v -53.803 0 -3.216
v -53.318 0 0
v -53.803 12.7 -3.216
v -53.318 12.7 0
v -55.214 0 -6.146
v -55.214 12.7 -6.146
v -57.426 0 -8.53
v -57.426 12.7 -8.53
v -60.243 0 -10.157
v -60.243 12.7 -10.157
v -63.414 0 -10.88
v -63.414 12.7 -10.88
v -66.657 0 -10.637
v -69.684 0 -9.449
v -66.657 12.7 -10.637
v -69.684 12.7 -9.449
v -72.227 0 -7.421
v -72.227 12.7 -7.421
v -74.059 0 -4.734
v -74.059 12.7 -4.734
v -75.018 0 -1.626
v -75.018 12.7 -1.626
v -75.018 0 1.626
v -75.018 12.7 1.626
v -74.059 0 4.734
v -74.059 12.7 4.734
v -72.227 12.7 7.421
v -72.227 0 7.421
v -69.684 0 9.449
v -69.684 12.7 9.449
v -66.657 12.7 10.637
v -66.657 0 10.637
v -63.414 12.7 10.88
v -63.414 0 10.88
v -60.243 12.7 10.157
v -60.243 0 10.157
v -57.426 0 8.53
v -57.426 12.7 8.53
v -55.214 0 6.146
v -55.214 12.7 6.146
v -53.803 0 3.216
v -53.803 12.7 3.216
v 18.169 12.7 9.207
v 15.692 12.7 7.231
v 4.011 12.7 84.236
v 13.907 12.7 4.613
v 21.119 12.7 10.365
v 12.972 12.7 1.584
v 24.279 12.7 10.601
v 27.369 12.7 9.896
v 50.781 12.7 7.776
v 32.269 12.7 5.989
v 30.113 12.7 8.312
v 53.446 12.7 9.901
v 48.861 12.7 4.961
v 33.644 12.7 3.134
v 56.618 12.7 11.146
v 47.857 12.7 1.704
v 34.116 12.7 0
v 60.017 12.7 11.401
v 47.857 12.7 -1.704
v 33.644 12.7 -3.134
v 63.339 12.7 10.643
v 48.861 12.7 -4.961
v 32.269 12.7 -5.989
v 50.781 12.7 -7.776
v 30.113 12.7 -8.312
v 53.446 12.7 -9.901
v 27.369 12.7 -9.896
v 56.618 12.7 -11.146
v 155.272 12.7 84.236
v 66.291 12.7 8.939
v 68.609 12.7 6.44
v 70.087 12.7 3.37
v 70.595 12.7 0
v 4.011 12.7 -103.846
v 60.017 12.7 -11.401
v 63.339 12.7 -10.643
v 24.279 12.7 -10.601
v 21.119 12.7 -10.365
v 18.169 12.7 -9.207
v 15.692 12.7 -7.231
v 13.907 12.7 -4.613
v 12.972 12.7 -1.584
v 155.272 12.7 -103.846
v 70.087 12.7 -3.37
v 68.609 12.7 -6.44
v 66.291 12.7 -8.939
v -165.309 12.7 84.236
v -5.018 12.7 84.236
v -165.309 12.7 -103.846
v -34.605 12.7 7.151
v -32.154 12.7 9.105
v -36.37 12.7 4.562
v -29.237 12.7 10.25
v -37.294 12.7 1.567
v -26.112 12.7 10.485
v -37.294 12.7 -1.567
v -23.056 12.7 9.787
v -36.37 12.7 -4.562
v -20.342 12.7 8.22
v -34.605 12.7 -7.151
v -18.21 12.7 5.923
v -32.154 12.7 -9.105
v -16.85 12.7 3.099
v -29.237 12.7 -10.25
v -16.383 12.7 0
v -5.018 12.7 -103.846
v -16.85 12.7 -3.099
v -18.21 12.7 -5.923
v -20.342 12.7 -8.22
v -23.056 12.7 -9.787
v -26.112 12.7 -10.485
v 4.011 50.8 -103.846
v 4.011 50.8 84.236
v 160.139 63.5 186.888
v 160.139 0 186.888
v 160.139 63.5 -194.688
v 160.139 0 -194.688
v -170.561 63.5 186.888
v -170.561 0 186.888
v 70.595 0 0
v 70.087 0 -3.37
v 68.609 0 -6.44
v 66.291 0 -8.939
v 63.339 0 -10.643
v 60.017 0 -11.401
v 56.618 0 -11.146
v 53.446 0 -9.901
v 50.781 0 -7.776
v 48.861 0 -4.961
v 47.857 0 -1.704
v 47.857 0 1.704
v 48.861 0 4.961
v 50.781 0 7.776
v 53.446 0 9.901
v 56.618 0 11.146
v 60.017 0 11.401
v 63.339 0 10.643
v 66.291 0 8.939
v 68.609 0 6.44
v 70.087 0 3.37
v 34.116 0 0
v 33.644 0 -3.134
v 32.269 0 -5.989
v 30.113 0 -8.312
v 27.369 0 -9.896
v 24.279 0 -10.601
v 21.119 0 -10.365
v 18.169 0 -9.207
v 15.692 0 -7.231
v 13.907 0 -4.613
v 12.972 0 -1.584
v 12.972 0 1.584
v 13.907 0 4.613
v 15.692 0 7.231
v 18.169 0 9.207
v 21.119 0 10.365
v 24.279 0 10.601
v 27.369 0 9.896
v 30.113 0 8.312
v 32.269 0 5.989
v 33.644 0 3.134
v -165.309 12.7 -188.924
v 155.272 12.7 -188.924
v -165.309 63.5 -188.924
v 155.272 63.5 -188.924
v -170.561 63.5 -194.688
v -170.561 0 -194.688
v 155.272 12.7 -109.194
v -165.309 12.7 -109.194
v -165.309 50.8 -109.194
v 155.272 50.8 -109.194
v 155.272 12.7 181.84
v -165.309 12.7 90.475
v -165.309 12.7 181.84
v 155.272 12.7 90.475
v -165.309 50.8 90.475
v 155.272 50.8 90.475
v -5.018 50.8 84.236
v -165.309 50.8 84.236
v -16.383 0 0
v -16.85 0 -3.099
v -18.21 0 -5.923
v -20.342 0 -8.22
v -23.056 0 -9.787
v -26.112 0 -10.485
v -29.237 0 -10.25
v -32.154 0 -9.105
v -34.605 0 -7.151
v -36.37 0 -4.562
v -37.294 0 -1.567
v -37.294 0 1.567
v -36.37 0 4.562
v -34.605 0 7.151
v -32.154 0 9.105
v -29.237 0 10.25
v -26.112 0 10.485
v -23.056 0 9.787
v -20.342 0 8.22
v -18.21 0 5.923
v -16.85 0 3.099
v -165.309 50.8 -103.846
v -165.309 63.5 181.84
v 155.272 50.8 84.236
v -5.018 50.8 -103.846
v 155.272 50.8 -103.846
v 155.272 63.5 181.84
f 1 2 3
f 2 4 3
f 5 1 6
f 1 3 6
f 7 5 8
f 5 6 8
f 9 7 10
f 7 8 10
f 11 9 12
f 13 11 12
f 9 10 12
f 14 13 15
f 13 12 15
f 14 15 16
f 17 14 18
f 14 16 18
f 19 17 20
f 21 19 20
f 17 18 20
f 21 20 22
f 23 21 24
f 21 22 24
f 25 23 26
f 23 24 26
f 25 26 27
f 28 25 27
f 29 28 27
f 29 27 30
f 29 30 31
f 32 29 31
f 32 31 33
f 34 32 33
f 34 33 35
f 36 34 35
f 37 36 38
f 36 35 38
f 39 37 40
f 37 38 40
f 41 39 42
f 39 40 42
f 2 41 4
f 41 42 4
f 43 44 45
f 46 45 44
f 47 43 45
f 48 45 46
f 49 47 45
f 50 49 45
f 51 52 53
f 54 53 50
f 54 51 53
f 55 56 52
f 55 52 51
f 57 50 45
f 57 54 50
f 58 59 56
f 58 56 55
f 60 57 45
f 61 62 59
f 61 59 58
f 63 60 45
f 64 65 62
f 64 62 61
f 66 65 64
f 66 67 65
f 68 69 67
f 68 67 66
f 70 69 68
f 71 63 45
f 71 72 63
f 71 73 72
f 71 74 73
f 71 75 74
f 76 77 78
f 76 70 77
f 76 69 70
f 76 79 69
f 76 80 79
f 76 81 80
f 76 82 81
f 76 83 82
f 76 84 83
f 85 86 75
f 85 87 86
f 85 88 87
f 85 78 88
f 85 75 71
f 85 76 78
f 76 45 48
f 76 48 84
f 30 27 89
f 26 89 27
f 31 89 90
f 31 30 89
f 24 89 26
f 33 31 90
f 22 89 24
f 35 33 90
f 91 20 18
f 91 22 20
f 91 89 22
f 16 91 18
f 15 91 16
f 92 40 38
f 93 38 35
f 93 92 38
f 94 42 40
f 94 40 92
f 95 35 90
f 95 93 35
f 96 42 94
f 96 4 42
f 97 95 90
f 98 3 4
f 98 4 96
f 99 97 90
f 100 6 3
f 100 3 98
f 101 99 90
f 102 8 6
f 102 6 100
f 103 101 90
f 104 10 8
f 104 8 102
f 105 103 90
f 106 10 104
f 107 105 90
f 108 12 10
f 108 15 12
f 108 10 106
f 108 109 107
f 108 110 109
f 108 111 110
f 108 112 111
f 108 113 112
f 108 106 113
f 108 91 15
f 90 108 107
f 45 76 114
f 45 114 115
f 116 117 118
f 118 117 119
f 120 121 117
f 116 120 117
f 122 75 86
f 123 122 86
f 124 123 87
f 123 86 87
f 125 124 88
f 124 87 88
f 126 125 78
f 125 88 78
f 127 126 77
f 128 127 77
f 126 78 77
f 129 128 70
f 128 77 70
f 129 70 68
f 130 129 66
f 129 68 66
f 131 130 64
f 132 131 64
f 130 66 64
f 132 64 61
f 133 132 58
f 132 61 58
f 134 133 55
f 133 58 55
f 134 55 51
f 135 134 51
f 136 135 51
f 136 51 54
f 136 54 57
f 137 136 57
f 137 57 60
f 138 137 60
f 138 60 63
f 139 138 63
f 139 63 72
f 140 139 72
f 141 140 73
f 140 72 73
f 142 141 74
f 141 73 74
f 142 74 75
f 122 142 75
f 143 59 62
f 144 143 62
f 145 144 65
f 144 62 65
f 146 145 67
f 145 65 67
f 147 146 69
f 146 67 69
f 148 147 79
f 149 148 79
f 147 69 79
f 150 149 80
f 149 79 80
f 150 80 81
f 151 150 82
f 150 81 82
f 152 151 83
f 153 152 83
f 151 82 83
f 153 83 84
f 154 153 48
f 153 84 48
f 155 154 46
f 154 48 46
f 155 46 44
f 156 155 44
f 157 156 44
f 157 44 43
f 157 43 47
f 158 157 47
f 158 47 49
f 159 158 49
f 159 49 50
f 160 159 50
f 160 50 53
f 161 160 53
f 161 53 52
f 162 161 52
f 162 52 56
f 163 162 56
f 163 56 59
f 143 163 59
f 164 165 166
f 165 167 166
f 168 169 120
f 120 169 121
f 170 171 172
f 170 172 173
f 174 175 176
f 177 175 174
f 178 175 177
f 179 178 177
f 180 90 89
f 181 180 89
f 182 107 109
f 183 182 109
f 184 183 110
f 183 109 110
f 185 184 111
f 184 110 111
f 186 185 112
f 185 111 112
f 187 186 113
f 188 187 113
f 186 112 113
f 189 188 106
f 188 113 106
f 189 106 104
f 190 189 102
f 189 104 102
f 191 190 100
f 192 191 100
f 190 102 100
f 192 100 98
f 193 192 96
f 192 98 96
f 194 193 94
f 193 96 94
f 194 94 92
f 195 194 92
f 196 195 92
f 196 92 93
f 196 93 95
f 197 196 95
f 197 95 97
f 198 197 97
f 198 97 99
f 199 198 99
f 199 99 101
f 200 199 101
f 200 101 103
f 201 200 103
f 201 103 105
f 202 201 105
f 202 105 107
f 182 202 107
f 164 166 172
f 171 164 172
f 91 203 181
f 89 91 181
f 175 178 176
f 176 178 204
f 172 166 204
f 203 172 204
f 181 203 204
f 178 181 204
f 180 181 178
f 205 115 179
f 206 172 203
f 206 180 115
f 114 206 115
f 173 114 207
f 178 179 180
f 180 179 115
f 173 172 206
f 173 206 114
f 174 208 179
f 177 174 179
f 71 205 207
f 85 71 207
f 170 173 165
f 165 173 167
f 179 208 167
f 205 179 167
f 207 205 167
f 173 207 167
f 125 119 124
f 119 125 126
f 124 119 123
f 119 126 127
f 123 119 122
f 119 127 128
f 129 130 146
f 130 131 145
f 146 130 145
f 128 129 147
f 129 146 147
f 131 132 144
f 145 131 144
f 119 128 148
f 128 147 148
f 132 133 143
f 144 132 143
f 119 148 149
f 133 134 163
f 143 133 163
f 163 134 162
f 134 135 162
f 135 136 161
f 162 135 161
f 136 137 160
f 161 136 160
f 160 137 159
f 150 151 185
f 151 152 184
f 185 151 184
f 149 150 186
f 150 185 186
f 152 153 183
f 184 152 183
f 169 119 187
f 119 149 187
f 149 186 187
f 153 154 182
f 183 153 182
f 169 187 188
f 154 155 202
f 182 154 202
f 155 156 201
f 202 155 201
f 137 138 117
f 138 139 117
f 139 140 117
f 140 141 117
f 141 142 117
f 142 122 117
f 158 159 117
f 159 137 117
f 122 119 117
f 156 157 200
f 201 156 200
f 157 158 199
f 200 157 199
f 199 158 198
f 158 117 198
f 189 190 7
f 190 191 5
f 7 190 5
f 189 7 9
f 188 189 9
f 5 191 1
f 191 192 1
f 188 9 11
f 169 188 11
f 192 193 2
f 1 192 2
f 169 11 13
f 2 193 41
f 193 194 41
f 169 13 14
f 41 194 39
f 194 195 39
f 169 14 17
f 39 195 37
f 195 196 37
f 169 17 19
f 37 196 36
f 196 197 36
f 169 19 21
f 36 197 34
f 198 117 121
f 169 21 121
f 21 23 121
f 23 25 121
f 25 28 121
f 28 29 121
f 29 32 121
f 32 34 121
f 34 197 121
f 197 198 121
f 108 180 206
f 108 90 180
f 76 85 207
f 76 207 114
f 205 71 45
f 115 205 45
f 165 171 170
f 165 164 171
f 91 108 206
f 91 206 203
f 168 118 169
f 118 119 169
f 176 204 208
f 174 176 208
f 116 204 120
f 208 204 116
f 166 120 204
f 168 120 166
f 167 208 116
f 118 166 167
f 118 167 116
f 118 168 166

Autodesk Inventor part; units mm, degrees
ref_plane "YZ Plane" through (0, 0, 0) normal (1, 0, 0) x (0, 1, 0)
ref_plane "XZ Plane" through (0, 0, 0) normal (0, 1, 0) x (-1, 0, 0)
ref_plane "XY Plane" through (0, 0, 0) normal (0, 0, 1) x (1, 0, 0)
sketch "Sketch2" plane through (0, 0, 0) normal (0, 1, 0) x (-1, 0, 0)
  line L0 (170.5606, 186.8878) -> (-160.1389, 186.8878)
  line L1 (-160.1389, 186.8878) -> (-160.1389, -194.6885)
  line L2 (-160.1389, -194.6885) -> (170.5606, -194.6885)
  line L3 (170.5606, -194.6885) -> (170.5606, 186.8878)
extrude "Extrusion1" add sketch "Sketch2" along normal blind 12.7
sketch "Sketch4" plane through (0, 12.7, 0) normal (0, 1, 0) x (1, 0, 0)
  line L0 (-170.5606, -186.8878) -> (160.1389, -186.8878) projected
  line L1 (160.1389, -186.8878) -> (160.1389, 194.6885) projected
  line L2 (-170.5606, -186.8878) -> (160.1389, -186.8878)
  line L3 (160.1389, -186.8878) -> (160.1389, 194.6885)
  line L4 (160.1389, 194.6885) -> (-170.5606, 194.6885)
  line L5 (-170.5606, 194.6885) -> (-170.5606, -186.8878)
  point P0 (0, 0)
extrude "Extrusion2" add sketch "Sketch4" along normal blind 50.8
sketch "Sketch5" plane through (0, 63.5, 0) normal (0, 1, 0) x (1, 0, 0)
  line L0 (-165.3089, -181.8398) -> (155.2723, -181.8398)
  line L1 (155.2723, -181.8398) -> (155.2723, 188.9245)
  line L2 (155.2723, 188.9245) -> (-165.3089, 188.9245)
  line L3 (-165.3089, 188.9245) -> (-165.3089, -181.8398)
  point P0 (0, 0)
extrude "Extrusion3" cut sketch "Sketch5" against normal blind 50.8
sketch "Sketch9" plane through (0, 12.7, 0) normal (0, 1, 0) x (1, 0, 0)
  line L0 (-165.3089, -181.8398) -> (-165.3089, 188.9245) projected
  line L1 (155.2723, 188.9245) -> (155.2723, -181.8398) projected
  line L2 (-165.3089, 109.1943) -> (155.2723, 109.1943)
  line L3 (155.2723, 109.1943) -> (155.2723, 103.846)
  line L4 (155.2723, 103.846) -> (-165.3089, 103.846)
  line L5 (-165.3089, 103.846) -> (-165.3089, 109.1943)
  line L6 (-165.3089, -90.4753) -> (155.2723, -90.4753)
  line L7 (155.2723, -90.4753) -> (155.2723, -84.2356)
  line L8 (155.2723, -84.2356) -> (-165.3089, -84.2356)
  line L9 (-165.3089, -84.2356) -> (-165.3089, -90.4753)
  line L10 (-5.0183, 103.846) -> (4.0112, 103.846)
  line L11 (4.0112, 103.846) -> (4.0112, -84.2356)
  line L12 (4.0112, -84.2356) -> (-5.0183, -84.2356)
  line L13 (-5.0183, -84.2356) -> (-5.0183, 103.846)
  point P0 (0, 0)
extrude "Extrusion6" add sketch "Sketch9" along normal blind 38.1 contours L0 L8 L1 L6 | L0 L2 L1 L4 | L13 L4 L11 L8
sketch "Sketch16" plane through (0, 12.7, 0) normal (0, 1, 0) x (1, 0, 0)
  circle A0 centre (23.4848, 0) radius 10.6311
  circle A1 centre (-26.8974, 0) radius 10.5141
  circle A2 centre (59.1623, 0) radius 11.4331
  circle A3 centre (-64.229, 0) radius 10.9108
  point P0 (0, 0)
extrude "Extrusion10" cut sketch "Sketch16" against normal blind 25.4
properties part number "Base no cutouts.stl"
